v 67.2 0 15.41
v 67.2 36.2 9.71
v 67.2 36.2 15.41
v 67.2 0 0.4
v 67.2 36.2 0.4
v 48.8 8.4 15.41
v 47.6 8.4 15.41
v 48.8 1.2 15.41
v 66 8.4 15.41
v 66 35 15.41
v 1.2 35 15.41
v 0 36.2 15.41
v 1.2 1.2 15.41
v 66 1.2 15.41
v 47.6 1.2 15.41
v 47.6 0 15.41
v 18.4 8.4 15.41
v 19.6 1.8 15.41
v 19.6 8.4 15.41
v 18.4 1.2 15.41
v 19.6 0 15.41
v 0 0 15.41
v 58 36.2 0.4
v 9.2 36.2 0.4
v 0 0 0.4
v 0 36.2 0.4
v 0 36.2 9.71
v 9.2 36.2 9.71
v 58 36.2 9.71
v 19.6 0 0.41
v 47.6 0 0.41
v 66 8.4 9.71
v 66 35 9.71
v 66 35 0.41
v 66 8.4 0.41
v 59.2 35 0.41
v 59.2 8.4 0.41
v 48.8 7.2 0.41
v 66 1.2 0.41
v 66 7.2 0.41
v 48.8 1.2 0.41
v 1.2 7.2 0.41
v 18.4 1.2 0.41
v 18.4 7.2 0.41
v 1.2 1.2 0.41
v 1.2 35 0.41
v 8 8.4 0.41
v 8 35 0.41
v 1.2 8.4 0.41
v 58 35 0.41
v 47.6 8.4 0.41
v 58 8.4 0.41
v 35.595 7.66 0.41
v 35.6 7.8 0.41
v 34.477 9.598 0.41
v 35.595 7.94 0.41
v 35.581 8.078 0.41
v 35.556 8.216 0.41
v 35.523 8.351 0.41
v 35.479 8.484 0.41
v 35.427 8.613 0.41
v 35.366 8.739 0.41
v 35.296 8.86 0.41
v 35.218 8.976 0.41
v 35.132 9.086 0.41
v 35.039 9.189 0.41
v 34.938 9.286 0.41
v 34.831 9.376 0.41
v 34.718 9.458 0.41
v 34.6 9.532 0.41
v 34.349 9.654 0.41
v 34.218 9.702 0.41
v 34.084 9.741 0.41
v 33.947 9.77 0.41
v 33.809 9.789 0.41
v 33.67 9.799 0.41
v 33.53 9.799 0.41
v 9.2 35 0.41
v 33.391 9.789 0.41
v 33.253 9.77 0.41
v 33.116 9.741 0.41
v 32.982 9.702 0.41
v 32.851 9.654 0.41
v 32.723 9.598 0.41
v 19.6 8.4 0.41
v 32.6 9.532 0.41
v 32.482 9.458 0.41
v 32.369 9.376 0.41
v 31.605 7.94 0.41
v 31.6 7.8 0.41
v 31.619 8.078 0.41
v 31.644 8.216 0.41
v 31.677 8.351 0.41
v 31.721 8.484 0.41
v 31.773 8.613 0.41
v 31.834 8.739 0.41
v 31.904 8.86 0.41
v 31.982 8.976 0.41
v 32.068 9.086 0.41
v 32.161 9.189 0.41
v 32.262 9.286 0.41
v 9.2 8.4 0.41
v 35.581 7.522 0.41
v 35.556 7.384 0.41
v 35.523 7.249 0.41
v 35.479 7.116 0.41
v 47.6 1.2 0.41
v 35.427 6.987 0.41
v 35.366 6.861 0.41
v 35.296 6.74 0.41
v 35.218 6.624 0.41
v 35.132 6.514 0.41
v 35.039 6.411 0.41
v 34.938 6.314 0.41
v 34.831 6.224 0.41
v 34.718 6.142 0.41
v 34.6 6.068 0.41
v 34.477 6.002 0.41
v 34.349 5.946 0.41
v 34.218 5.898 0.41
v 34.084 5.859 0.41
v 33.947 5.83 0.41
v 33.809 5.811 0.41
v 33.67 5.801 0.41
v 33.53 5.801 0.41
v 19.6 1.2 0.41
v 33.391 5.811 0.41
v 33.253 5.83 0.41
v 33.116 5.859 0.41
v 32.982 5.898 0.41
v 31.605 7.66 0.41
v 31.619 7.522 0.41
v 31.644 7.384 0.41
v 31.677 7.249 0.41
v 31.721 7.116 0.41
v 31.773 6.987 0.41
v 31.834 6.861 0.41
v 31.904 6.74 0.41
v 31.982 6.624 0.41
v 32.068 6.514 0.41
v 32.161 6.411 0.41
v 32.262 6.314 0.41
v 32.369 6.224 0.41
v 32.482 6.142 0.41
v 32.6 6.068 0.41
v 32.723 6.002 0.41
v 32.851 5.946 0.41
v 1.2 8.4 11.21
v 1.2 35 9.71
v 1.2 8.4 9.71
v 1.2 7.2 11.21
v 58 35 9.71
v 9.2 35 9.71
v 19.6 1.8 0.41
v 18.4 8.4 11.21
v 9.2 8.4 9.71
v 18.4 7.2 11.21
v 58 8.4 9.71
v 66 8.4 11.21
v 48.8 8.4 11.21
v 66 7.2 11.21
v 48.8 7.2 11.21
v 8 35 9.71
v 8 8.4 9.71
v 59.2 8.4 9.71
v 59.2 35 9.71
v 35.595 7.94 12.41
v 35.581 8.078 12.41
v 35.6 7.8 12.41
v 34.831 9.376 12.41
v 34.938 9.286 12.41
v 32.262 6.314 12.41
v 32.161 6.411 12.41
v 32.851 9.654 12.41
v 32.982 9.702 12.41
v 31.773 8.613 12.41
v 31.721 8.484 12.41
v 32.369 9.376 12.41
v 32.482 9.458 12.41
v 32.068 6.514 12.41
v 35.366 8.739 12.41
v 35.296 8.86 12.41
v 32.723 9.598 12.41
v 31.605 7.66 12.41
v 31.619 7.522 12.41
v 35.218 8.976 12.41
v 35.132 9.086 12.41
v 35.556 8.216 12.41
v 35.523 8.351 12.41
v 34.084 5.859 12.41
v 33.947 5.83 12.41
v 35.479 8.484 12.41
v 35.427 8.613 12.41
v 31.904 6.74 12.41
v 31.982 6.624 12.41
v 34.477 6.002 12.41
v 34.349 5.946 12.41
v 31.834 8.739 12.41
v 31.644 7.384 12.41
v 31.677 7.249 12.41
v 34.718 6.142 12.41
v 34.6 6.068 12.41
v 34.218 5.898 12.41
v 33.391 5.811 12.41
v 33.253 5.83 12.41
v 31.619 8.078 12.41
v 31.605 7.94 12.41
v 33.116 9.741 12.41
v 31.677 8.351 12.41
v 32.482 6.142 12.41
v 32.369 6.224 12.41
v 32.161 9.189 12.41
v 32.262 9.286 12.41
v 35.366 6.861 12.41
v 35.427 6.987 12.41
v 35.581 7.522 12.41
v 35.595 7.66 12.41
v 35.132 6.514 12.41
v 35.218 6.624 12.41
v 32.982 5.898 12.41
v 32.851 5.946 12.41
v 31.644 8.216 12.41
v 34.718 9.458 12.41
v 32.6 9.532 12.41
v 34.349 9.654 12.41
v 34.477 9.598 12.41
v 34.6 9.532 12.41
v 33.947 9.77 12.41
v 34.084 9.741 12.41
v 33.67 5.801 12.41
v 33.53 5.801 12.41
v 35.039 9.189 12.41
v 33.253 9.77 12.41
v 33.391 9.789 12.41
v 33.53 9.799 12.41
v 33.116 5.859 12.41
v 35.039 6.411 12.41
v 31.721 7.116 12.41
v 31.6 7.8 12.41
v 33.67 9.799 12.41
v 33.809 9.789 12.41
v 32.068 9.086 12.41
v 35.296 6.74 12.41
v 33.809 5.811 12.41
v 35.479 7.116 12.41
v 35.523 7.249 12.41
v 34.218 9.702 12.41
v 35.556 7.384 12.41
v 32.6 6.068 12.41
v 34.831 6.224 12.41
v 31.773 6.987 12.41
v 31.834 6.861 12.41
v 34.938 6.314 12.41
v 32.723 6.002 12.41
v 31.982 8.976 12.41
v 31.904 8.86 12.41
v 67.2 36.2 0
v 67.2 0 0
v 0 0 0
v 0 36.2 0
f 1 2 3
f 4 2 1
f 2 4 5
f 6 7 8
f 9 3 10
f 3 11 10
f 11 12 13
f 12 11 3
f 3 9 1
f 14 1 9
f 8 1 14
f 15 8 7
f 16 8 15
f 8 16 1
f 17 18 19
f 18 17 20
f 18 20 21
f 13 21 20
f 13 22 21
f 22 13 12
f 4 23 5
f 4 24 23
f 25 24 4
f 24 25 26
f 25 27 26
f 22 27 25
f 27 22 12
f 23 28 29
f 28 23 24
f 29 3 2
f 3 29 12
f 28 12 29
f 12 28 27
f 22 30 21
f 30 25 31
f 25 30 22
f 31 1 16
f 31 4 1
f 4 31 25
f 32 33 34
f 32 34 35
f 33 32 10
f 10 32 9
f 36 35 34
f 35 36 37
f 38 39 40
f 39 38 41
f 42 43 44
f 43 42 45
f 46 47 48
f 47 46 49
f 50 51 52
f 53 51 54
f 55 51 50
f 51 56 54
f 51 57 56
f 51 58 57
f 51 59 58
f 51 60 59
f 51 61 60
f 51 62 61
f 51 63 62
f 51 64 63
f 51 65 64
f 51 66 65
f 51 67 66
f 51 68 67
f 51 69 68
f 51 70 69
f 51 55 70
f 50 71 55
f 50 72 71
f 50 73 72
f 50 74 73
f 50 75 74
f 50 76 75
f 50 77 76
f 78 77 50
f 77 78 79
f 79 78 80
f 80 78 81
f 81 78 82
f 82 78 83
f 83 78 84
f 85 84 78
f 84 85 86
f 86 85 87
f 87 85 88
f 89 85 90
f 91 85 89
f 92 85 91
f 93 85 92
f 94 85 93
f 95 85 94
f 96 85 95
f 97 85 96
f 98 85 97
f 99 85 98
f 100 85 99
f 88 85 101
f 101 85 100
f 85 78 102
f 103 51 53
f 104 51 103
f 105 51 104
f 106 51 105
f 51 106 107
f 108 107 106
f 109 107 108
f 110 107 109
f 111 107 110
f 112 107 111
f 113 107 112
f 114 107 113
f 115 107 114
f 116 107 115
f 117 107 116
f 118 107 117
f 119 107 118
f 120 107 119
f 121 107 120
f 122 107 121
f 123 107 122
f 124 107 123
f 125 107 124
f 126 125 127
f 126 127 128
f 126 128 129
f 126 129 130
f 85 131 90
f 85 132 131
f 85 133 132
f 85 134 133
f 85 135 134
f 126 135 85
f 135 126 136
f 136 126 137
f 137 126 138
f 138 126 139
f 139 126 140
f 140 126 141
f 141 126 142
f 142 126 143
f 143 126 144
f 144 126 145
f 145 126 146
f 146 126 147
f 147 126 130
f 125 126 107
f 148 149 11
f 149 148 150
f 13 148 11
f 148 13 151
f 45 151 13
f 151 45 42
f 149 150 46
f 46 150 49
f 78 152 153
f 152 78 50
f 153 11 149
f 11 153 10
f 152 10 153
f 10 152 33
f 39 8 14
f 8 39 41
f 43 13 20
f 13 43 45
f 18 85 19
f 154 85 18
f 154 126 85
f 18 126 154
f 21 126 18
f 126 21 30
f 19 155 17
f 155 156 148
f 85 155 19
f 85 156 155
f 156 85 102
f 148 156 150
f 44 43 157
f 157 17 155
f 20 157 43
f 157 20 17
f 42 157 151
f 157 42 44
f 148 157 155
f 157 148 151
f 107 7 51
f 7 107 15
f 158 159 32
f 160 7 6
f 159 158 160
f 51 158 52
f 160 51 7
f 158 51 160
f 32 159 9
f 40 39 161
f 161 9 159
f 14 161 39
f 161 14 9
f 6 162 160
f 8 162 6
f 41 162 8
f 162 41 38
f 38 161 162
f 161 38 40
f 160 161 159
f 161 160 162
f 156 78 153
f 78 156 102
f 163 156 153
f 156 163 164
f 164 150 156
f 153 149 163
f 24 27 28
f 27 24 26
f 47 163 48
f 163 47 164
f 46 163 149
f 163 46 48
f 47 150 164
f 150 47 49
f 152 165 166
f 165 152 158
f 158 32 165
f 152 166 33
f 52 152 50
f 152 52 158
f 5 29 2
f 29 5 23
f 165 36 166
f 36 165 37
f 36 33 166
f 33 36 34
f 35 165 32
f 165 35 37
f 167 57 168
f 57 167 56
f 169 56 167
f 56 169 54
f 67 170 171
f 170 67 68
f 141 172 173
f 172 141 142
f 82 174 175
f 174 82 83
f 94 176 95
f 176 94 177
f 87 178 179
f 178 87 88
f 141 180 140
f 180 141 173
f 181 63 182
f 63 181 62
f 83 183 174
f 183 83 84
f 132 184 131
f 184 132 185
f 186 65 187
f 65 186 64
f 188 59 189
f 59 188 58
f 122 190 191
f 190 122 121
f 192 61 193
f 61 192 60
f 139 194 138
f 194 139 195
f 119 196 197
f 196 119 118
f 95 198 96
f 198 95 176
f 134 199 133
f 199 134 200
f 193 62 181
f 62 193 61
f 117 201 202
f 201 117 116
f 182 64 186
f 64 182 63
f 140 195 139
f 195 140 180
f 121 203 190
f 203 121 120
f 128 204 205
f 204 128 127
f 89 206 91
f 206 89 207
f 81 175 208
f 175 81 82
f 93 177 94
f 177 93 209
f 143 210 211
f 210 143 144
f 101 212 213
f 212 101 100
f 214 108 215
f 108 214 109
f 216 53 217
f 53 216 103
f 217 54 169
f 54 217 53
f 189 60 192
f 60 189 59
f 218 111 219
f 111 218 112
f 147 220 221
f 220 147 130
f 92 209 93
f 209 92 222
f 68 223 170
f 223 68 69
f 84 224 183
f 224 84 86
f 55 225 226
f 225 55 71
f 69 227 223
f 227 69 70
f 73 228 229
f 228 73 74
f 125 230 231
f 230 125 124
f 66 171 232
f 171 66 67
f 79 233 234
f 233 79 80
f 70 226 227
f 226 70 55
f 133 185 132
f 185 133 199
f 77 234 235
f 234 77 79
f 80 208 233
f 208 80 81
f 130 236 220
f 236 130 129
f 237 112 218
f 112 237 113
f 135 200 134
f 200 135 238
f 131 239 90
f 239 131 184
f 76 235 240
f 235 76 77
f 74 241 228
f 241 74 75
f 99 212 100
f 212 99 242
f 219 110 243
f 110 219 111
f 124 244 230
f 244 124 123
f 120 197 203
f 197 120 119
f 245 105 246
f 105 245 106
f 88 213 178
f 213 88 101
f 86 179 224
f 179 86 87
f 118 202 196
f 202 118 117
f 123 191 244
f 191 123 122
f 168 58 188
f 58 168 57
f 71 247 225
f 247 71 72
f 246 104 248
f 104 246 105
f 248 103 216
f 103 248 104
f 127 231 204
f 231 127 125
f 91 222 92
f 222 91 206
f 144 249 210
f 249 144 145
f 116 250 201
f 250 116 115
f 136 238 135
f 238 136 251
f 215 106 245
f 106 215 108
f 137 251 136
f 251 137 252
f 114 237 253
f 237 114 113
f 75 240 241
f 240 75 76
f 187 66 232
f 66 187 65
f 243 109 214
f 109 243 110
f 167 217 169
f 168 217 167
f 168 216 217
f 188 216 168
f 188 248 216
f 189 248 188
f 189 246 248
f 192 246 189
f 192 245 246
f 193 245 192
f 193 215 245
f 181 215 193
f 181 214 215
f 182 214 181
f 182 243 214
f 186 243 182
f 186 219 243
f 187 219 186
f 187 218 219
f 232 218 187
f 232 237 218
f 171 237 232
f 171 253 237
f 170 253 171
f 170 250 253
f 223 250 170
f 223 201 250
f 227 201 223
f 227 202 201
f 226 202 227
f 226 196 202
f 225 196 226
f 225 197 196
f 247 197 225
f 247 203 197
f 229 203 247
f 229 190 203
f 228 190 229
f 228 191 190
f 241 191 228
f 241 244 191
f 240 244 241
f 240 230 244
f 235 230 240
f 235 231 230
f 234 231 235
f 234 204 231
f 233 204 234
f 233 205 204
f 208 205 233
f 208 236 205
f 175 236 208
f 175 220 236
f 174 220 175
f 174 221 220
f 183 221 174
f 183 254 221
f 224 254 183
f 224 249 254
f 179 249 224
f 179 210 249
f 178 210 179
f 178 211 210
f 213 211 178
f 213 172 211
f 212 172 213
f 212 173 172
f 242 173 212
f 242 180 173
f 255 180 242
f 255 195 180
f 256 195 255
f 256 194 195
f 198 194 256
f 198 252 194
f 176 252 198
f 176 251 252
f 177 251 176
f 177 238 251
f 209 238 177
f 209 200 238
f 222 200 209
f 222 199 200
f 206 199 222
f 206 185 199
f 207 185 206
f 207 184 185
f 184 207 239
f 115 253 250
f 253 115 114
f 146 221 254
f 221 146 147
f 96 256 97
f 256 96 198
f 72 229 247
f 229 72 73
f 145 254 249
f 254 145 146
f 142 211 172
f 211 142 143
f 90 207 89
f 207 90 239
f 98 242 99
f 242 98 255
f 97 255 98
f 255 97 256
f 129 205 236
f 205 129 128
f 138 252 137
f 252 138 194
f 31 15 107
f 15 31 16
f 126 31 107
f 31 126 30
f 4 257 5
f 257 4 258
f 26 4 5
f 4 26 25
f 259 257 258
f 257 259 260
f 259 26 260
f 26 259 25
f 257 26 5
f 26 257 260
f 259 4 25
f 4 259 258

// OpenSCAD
// file: ../../Base/Boxes.scad
// Fischertechnik Box Foundation
// Pre-designed Boxes

use <Constants.scad>

include <PlacementOptions.scad>

box190Width = 190;
box190Depth = 130;
box130Width = 130;
box130Depth = 95;
boxUsageHeight = 33.9;
boxWallThickness = 2.4;
boxBaseThickness = 1.0;
boxWebWidth = 3.0;

// getBoxWallThickness()
// Gets the wall thickness of a Fischertechnik Box

function getBoxWallThickness() = boxWallThickness;

// Gets the usable height of a fischertechnik box
function getBoxUsageHeight() = boxUsageHeight;

// Gets the thickness of the Fischertechnik box base.
function getBoxBaseThickness() = boxBaseThickness;

// Gets the width of a box web
function getBoxWebWidth() = boxWebWidth;

// Gets the usable inner space of a Box 190 as an x/y-list
function getBox190Space() = [
    box190Width - 2*getBoxWallThickness(), 
    box190Depth - 2*getBoxWallThickness() ];

// Imports the Fischertechnik empty box 130x190 mm and places it at position 0,0
// 190x130 are the outer sizes, the inner space is slightly smaller. Use getBox190Space() to get the inner sizes.
// This module needs the STL file "Fischertechnik Box 130x190.stl" in the library path.
// The box is positioned that the usable inner space is at the 0,0,0 position. The

module Box190() {
    translate([-getBoxWallThickness(),-getBoxWallThickness(),-getBoxBaseThickness()])
        import("Fischertechnik Box 130x190.stl", convexity=3);
}

// Gets the usable inner space of a Box 130 as an x/y-list
function getBox130Space() = [
    box130Width - 2*getBoxWallThickness(), 
    box130Depth - 2*getBoxWallThickness() ];

// Imports the Fischertechnik empty box 95x130 mm and places it at position 0,0
// 190x130 are the outer sizes, the inner space is slightly smaller. Use getBox190Space() to get the inner sizes.
// This module needs the STL file "Fischertechnik Box 95x130.stl" in the library path.
// The box is positioned that the usable inner space is at the 0,0,0 position. The

module Box130() {
    translate([-getBoxWallThickness(),-getBoxWallThickness(),-getBoxBaseThickness()])
        import("Fischertechnik Box 95x130.stl", convexity=3);
}

// Creates a web at the specified box walls
// corner 0 = LowerLeft, 1 = UpperLeft, 2 = UpperRight, 3 = LowerRight
// side 0 = LeftOfCorner, 1 = RightOfCorner
// distance = Distance in mm from the corner
// box = inner width and depth of the box (default: Box 190)
// webWidth = length of the web (default is 3 mms)
// webThickness = thickness of the web (default is 1 mm)

module BoxWeb(corner, side, distance, box=getBox190Space(), webWidth=getBoxWebWidth(), webThickness=1.0) {
    sink = getBoxWallThickness()/2;

    width = (corner % 2 == 0) ? 
            (side == LeftOfCorner ? webWidth : webThickness) :
            (side == LeftOfCorner ? webThickness : webWidth);

    depth = (corner % 2 == 0) ? 
            (side == RightOfCorner ? webWidth : webThickness) :
            (side == RightOfCorner ? webThickness : webWidth);
    
    xDiff = corner == LowerLeft ? 
                (side == LeftOfCorner ? -sink : distance) :
            (corner == UpperLeft ?                
                (side == LeftOfCorner ? distance : -sink) :
            (corner == UpperRight ?
                (side == LeftOfCorner ? box.x-webWidth+sink : box.x-distance-webThickness) :
                (side == LeftOfCorner ? box.x-distance-webThickness: box.x-webWidth+sink)));

    yDiff = corner == LowerLeft ? 
                (side == RightOfCorner ? -sink : distance) :
            (corner == UpperLeft ?
                (side == RightOfCorner ? box.y-distance : box.y-webWidth+sink) :
            (corner == UpperRight ?
                (side == RightOfCorner ? box.y-webWidth+sink : box.y-distance) :
                (side == RightOfCorner ? distance : -sink)));
    
    translate([xDiff, yDiff, -getExcess()])
        cube([width, depth, boxUsageHeight + 2*getExcess()]);
}
// file: ../../Base/Rotation.scad
// Fischertechnik Box Foundation
// Geometry Helpers Rotation

include <PlacementOptions.scad>

// getRotatedSpace(space, rotation=NoRotation)
// Rotates the space dependent on the specified rotation

function getRotatedSpace(space, rotation=NoRotation) = [
    (rotation == Rotate90 || rotation == Rotate270) ? space.y : space.x,
    (rotation == Rotate90 || rotation == Rotate270) ? space.x : space.y
];

// Rotates the given space around the fixed left lower corner
// space = the space the children needs as width/depth list [width,depth]
// rotation = 0 Rotate0 degrees, 1 Rotate90 degrees, 2 Rotate180 degrees, 3 Rotate270 degrees (equivalent to -90)

module RotateFix(space, rotation=Rotate0) {
    dy = (rotation == Rotate0 || rotation == Rotate270) ? 0 :
        (rotation == Rotate90) ? space.x :
        space.y;
    dx = (rotation < Rotate180) ? 0 :
        (rotation == Rotate180) ? space.x :
        space.y;
    
    translate([dx, dy, 0])
        rotate([0, 0, rotations[rotation]])
            children();
}
// file: ../../Base/Alignment.scad
// Fischertechnik Box Foundation
// Geometry Helpers Alignment

include <PlacementOptions.scad>

// getAlignedX(elementWidth, spaceWidth, align=AlignRight, offset=0)
// Gets the aligned X offset of an element with the given
// width in the given space.
// elementWidth = The width of the element to positon
// spaceWidth = The space where the element should be aligned
// align = 0 AlignLeft, 1 AlignCenter, 2 AlignRight
// offset = an optional offset from the aligned position. When
// aligned left or centered, then positive values are in X direction.
// When aligned right then positive values are in negative X direction.

function getAlignedX(elementWidth, spaceWidth, align=AlignRight, offset=0) =
    (align == AlignLeft) ?
        offset :
        ((align == AlignCenter) ?
        (spaceWidth - elementWidth)/2 + offset :
        spaceWidth - offset - elementWidth);

// getAlignedY(elementDepth, spaceDepth, align=AlignTop, offset=0)
// Gets the aligned Y offset of an element with the given
// depth in the given space.
// elementDepth = The depth of the element to positon
// spaceDepth = The space where the element should be aligned
// align = 0 AlignBottom, 1 AlignCenter, 2 AlignTop
// offset = an optional offset from the aligned position. When
// aligned bottom or centered, then positive values are in Y direction.
// When aligned top then positive values are in negative Y direction.

function getAlignedY(elementDepth, spaceDepth, align=AlignTop, offset=0) =
    (align == AlignBottom) ?
        offset :
        ((align == AlignCenter) ?
        (spaceDepth - elementDepth)/2 + offset :
        spaceDepth - offset - elementDepth);
// file: ../../Base/PlacementOptions.scad
// Fischertechnik Box Foundation
// Placement Options

// Alignment
NoAlign = 0;
AlignLeft = 1;
AlignBottom = 2;
AlignCenter = 3;
AlignRight = 4;
AlignTop = 5;

// Element rotation degree steps
rotations = [0, -90, -180, -270];

// Rotation
NoRotation = 0;
Rotate0 = 0;
Rotate90 = 1;
Rotate180 = 2;
Rotate270 = 3;

// Docking (seen from above)
NoDock = -1;
DockLeft = 0;
DockTop = 1;
DockRight = 2;
DockCorner = 2;
DockBottom = 3;

// Web corners
LowerLeft = 0;
UpperLeft = 1;
UpperRight = 2;
LowerRight = 3;

// Web position relative to corner
LeftOfCorner = 0;
RightOfCorner = 1;
// file: ../../Base/Placement.scad
// Fischertechnik Box Foundation
// Geometry Helpers Placement

use <Constants.scad>
use <Alignment.scad>
use <Rotation.scad>
use <Boxes.scad>

include <PlacementOptions.scad>

// Place(x=0, y=0, elementSpace=[0,0], alignX=AlignLeft, alignY=AlignBottom, rotation=Rotate0, boxSpace=getBox190Space())
// Places the child at the specified position
// y = Y-Position. This is a relative position when an X aligment is specified.
// x = X-Position. This is a relative position when an Y aligment is specified.
// elementSpace = space of the element to be placed [x,y]
// alignX = -1=NoAlign, 0 AlignLeft, 1 AlignCenter, 3 AlignRight (elementSpace and boxSpace required!)
// alignY = -1=NoAlign, 2 AlignBottom, 1 AlignCenter, 4 AlignTop (elementSpace and boxSpace required!)
// rotation = 0 Rotate0 0 degrees, 1 Rotate90 90 degrees, 
// 2 Rotate180 180 degrees, 3 Rotate270 270 degrees (equivalent to -90)
// boxSpace = Inner space of the box where the placement occurs [x,y] - default is Box 190x130 inner space

module Place(x=0, y=0, elementSpace=[0,0], 
  alignX=AlignLeft, alignY=AlignBottom, 
  rotation=NoRotation, boxSpace=getBox190Space()) {

    module Position(x, y, space, rotation=Rotate0) {
        translate([x, y, 0])
            RotateFix(space, rotation)
                children();
    }

    space = getRotatedSpace(elementSpace, rotation);
    alignedX = getAlignedX(space.x, boxSpace.x, alignX, x);
    alignedY = getAlignedY(space.y, boxSpace.y, alignY, y);
    Position(alignedX, alignedY, elementSpace, rotation)
        children();
}

// Center(space=getBox130Space(), elementSpace=[0,0])
// space = Space where the children is centered. For cylinder use centered=true and no elementSpace.
// elementSpace = space of the element to be centered [x,y]

module Center(space=getBox190Space(), elementSpace=[0,0]) {
    translate([(space.x - elementSpace.x) / 2, (space.y - elementSpace.y) / 2])
        children(0);
}

// CenterHorizontal(width=0, y=0, offset=0, space=getBox130Space())
// space = Space where the children is centered. For cylinder use centered=true and no elementSpace.
// elementSpace = space of the element to be centered [x,y]

module CenterHorizontal(width=0, y=0, offset=0, space=getBox190Space()) {
    translate([(space.x - width) / 2 + offset, y])
        children(0);
}

// CenterVertical(depth=0, x=0, offset=0, space=getBox130Space())
// space = Space where the children is centered. For cylinder use centered=true and no elementSpace.
// elementSpace = space of the element to be centered [x,y]

module CenterVertical(depth=0, x=0, offset=0, space=getBox190Space()) {
    translate([x, (space.y - depth) / 2 + offset])
        children(0);
}
// file: ../../Elements/AxisClip10.scad
// Fischertechnik Box Library
// Axis for clip 10
// 31023

use <../ModelBase/Simple.scad>

width = 12;
depth = 12;
height = 23;

// getAxisClip10Space()
// Gets the space of a frame for a clip 10 with spring ring (mot2)

function getAxisClip10Space() = [width, depth, height];

// AxisClip10()
// Axis for clip 10 with spring ring (mot2)

module AxisClip10() {
    LeveledAxisWithSpace(height, height-10, getAxisClip10Space());
}

// Tests
color("lightgray")
AxisClip10();
// file: ../../Base/Constants.scad
// Fischertechnik Box Foundation
// Constants

// Constant values necessary for multiple elements

// Base constants
dividerThickness = 1.2;
excess = 0.01;
fragments = 90;
tolerance = 0.8;

// Gets the thickness of a divider 
function getDividerThickness() = dividerThickness;

// Gets the excess that is used to merge walls into each other
function getExcess() = excess;

// Gets amount of fragments of a cylinder
function getFragments() = fragments;

// Gets the inner tolerance of a frame to each side
function getTolerance() = tolerance;


// Fischertechnik specific constants
axisDiameter = 4;
axisBottomDiameter = axisDiameter + 1;
standardEdgeDistance = 2.5;
standardWebDistance = 11.5;
standardCornerLength = 15;
tubeWallFactor = 0.8;

// Gets axis diameter
function getAxisDiameter() = axisDiameter;

// Gets axis bottom diameter for thicker part at the bottom
function getAxisBottomDiameter() = axisBottomDiameter;

// gets the standard distance to the wall of the box for dockable frames with webs
function getStandardEdgeDistance() = standardEdgeDistance;

// gets the standard distance of each web to the corner of the dockable frame
function getStandardWebDistance() = standardWebDistance;

// gets the standard length of the corner walls of a dockable frame
function getStandardCornerLength() = standardCornerLength;

// gets the wall thickness of a tube.
function getTubeWallThickness() = tubeWallFactor * getDividerThickness();
// file: ../../Elements/FrameToothedTileBarWithControlLinks.scad
// Fischertechnik Box Library
// Toothed Tile Bar with Control Links
// 38472, 2x38473

use <../Base/Constants.scad>
use <../Base/Placement.scad>
use <../ModelBase/Simple.scad>

include <../Base/PlacementOptions.scad> 

width = 64;
depth = 33;
height = 15;

// getFrameToothedTileBarWithControlLinksSpace
// Gets the space the toothed tile bar with control links needs as width and depth (.x and .y as a list)

function getFrameToothedTileBarWithControlLinksSpace() = getFrameOuterVolume([width, depth, height]);

// FrameToothedTileBarWithControlLinks()
// rame for toothed tile bar with two control links
// 38472, 2x38473

module FrameToothedTileBarWithControlLinks() {    
    sideHeight = 9.3;
    endHeight = 10.8;
    innerFrameDistance = 6;
    axisHeight = 12;
    cutoffWidth = 28;

    outerSpace = getFrameToothedTileBarWithControlLinksSpace();
    endWidth = (outerSpace.x - cutoffWidth) / 2 - 2 * getDividerThickness();
    endDepth = innerFrameDistance;

    module EndPiece() {
        difference() {
            Frame ([endWidth, endDepth, height], 0);
            translate([getDividerThickness(), endDepth+getDividerThickness()/2, endHeight])
                cube([endWidth, 2*getDividerThickness(), height - endHeight + getExcess()]);
        }
    }
    
    module AllFrames() {
        Frame ([width, depth, height]);
        innerVolume = getFrameInnerVolume([width, depth, height]);
        
        endSpace = getFrameOuterVolume([endWidth, endDepth, endHeight], 0);

        EndPiece();
        Place(elementSpace=endSpace, alignX=AlignRight, boxSpace=outerSpace)
            EndPiece();
        
        sideWidth = innerFrameDistance;
        sideDepth = depth - endDepth - getDividerThickness();
        sideYOffset = endDepth + getDividerThickness();
        
        translate ([0, sideYOffset, 0])
            Frame ([sideWidth, sideDepth, sideHeight]);
        sideXOffset = width - innerFrameDistance;
        translate ([sideXOffset, sideYOffset, 0])
            Frame ([sideWidth, sideDepth, sideHeight]);            
            
        translate([innerVolume.x/2 + getDividerThickness(), innerFrameDistance + getDividerThickness()*1.5])
            Axis(axisHeight);
    }
    
    cutOffXOffset = (getFrameToothedTileBarWithControlLinksSpace().x - cutoffWidth) / 2;
    
    difference() {
        AllFrames();
        Center([getFrameToothedTileBarWithControlLinksSpace().x, getDividerThickness()], [cutoffWidth, 2*getDividerThickness()])
            cube([cutoffWidth, 2*getDividerThickness(), height+1]);
    }
}

// Test
color("lightgray")
FrameToothedTileBarWithControlLinks();
// file: ../TestPrint.scad
// 3D Print Test Base

use <../Base/Constants.scad>

use <../Elements/AxisClip10.scad>

module TestPrint(elementSpace) {
    cube([elementSpace.x, elementSpace.y, 0.4]);
    translate([0,0,0.4+getExcess()]) {
        children();
    }
}

TestPrint(getAxisClip10Space())
    AxisClip10();
// main file
// 3D Print Test Base
// FrameToothedTileBarWithControlLinks

use <../TestPrint.scad>
use <../../Elements/FrameToothedTileBarWithControlLinks.scad>

TestPrint(getFrameToothedTileBarWithControlLinksSpace())
    FrameToothedTileBarWithControlLinks();
